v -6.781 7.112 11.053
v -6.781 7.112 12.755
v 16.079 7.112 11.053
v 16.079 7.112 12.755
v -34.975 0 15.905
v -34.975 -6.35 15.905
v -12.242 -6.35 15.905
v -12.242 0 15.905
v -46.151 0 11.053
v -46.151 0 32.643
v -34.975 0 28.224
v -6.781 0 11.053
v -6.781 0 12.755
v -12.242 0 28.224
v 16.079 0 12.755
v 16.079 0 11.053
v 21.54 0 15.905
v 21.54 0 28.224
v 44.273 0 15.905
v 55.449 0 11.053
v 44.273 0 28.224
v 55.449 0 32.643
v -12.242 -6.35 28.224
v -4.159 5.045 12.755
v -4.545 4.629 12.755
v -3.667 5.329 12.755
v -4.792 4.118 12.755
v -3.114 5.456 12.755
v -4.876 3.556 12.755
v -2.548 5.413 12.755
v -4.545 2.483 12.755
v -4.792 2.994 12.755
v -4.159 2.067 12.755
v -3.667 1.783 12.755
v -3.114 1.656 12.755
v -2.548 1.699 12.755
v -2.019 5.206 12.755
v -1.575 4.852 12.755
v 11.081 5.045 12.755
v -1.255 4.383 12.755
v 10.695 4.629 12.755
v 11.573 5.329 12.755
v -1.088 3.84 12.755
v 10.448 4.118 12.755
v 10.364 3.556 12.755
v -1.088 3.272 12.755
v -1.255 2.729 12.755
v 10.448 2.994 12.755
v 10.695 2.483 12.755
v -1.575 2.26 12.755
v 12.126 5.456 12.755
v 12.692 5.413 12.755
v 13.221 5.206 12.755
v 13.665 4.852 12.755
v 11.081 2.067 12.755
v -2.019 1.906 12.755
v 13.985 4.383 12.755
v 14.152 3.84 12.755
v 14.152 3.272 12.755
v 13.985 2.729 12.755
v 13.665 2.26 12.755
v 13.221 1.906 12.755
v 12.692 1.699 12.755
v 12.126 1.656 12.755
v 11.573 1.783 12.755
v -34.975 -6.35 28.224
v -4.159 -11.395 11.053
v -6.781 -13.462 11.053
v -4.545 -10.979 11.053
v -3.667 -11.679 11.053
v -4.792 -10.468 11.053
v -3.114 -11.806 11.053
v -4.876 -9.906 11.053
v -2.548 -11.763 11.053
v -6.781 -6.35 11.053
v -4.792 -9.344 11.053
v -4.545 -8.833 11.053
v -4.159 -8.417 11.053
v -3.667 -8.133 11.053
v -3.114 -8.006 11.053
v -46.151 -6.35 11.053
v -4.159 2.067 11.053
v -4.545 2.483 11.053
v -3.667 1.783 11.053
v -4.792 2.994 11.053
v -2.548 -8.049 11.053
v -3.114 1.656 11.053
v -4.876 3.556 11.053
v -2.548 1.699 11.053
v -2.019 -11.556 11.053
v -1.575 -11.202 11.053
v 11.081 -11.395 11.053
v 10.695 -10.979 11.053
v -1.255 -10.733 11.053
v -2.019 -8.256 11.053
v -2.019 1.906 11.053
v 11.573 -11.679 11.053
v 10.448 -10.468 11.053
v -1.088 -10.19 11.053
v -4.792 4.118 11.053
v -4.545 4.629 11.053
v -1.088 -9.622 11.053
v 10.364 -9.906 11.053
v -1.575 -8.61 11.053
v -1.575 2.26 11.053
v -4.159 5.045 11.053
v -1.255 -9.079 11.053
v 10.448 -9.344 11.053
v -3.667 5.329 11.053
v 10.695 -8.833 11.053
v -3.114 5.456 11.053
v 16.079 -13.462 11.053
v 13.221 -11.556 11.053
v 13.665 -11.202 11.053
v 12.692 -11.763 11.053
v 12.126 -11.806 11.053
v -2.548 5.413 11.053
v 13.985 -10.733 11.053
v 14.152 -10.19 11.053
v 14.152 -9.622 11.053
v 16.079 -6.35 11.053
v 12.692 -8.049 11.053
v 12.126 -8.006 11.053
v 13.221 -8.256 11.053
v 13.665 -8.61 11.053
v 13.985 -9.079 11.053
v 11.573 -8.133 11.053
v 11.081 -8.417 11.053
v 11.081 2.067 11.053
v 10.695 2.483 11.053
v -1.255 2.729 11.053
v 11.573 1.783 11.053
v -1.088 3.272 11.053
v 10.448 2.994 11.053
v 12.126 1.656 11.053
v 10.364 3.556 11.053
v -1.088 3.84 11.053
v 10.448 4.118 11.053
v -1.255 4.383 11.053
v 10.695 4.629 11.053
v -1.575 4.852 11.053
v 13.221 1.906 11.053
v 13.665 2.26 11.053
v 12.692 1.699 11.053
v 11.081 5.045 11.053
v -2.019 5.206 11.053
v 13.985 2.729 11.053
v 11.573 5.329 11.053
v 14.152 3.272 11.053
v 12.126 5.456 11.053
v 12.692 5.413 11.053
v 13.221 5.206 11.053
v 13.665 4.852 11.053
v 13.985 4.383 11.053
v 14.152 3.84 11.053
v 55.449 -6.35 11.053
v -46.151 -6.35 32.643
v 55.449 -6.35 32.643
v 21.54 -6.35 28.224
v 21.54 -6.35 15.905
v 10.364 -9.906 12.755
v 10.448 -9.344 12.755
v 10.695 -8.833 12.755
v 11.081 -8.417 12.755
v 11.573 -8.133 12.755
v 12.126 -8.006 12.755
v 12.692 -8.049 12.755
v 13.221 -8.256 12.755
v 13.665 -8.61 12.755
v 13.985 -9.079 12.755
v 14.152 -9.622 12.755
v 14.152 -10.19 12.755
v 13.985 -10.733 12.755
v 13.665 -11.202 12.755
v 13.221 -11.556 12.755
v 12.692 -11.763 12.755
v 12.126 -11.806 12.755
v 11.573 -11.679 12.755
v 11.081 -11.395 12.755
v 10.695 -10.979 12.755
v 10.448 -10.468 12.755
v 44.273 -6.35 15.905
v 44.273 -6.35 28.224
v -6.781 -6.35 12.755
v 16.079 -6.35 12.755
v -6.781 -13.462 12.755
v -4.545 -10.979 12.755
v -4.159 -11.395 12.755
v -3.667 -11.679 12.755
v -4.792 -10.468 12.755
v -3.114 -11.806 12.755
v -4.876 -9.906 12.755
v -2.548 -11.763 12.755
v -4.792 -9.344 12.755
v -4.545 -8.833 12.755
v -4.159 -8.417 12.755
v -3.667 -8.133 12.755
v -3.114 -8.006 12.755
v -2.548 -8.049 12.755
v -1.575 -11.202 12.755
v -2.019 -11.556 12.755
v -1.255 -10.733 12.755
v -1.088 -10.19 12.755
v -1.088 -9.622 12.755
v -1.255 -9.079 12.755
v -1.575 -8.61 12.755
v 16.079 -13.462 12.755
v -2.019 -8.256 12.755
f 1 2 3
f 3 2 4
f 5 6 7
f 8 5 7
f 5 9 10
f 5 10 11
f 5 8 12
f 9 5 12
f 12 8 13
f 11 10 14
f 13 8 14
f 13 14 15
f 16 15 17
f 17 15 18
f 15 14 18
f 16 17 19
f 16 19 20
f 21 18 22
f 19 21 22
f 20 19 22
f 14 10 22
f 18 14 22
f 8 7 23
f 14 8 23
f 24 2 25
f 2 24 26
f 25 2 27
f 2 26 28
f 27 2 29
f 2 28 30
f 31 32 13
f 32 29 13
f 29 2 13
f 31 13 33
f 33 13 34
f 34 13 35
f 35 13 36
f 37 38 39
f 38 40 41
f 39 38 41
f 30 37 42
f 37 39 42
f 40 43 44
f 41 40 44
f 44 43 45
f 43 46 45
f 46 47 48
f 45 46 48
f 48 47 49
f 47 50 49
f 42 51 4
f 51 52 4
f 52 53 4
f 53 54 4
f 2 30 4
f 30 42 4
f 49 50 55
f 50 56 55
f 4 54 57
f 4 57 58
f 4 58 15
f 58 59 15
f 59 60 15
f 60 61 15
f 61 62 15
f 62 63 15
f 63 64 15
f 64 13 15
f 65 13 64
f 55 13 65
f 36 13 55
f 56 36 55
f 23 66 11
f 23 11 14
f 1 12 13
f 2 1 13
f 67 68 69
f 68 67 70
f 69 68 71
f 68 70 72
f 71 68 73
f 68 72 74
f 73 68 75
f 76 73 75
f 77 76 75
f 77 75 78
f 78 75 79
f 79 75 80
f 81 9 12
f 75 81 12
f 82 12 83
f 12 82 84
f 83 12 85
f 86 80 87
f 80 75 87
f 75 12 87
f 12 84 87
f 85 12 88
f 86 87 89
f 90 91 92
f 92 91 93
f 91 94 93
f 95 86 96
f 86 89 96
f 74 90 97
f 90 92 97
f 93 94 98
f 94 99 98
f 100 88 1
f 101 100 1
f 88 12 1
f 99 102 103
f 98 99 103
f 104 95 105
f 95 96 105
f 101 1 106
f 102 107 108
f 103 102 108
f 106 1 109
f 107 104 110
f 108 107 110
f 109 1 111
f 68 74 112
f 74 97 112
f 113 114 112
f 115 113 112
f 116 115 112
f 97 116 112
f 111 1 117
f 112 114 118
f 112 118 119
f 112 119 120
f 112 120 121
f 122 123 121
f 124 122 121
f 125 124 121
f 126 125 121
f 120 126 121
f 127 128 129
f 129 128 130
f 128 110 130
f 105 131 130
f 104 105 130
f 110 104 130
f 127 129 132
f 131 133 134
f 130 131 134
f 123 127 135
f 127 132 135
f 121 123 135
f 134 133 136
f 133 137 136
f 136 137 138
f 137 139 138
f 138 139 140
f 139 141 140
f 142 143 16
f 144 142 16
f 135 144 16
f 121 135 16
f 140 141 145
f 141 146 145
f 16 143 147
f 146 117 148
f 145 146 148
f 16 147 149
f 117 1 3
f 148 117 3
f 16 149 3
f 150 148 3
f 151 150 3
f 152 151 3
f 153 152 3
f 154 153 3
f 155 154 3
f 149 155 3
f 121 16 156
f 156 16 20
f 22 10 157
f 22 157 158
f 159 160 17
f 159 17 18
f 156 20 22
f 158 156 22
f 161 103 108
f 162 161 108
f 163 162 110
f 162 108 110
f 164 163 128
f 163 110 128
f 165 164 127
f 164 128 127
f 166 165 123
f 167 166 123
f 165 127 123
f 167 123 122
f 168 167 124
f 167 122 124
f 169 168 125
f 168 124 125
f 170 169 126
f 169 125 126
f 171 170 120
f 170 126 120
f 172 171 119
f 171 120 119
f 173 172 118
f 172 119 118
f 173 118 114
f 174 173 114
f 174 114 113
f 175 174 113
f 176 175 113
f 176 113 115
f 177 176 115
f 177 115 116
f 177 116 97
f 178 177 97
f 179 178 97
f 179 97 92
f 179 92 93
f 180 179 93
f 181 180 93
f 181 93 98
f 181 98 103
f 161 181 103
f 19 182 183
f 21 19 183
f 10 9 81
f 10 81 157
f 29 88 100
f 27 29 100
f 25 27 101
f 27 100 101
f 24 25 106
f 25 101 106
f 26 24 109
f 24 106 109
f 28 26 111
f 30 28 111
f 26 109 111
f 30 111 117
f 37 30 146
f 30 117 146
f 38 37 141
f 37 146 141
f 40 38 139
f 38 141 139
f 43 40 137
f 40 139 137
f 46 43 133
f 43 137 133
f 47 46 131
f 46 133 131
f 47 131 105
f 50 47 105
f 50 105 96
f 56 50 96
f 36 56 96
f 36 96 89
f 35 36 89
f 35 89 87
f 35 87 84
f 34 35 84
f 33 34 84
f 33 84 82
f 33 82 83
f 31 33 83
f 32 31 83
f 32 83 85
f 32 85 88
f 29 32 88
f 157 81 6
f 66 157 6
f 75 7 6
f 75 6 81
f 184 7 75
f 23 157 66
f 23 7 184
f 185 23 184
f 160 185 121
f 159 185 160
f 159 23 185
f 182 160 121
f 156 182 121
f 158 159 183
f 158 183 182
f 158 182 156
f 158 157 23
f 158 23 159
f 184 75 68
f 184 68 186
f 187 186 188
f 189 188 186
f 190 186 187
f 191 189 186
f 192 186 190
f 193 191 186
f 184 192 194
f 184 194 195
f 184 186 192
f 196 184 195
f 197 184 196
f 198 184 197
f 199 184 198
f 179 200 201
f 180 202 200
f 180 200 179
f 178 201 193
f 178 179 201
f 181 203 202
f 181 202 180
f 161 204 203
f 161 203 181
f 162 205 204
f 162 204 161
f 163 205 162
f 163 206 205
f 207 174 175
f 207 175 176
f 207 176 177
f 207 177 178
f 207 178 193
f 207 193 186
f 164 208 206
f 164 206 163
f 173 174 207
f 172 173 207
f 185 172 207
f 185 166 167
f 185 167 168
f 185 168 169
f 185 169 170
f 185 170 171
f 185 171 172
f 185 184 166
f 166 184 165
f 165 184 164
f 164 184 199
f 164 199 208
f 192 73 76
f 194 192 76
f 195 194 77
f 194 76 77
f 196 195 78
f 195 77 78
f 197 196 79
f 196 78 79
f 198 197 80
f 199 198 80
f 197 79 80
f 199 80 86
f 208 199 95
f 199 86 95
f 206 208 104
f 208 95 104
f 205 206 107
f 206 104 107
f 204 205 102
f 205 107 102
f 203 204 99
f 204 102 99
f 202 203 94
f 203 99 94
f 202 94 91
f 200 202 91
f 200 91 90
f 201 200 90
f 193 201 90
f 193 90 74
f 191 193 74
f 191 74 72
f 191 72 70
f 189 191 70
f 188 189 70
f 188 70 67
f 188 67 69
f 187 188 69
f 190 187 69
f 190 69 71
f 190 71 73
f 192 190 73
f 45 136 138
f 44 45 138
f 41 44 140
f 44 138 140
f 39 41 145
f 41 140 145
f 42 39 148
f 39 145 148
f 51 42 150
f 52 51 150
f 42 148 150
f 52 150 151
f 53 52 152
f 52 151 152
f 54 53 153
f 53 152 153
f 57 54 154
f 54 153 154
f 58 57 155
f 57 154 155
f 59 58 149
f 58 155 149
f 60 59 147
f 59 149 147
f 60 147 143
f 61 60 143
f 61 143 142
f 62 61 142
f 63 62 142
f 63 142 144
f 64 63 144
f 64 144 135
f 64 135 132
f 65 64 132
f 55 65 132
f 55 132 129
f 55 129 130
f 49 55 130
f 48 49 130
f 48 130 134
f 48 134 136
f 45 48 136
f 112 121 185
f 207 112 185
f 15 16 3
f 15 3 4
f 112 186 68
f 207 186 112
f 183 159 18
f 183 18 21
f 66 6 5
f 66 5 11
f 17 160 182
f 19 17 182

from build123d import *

# Parameters (mm, degrees)
F0_W     = 101.6
F0_H     = 21.59
F1_DEPTH = 6.35
F2_W     = 22.733
F2_H     = 12.319
F3_DEPTH = 25.4
F4_W     = 22.86
F4_H     = 1.7018
F5_DEPTH = 7.112
F6_W     = 22.86
F6_H     = 1.7018
F7_DEPTH = 7.112
F9_D     = 3.81


with BuildPart() as f1:
    # F0 (on Front) → F1 (new body)
    with BuildSketch(Plane.XZ):
        with Locations((4.648548, 21.848283)):
            Rectangle(F0_W, F0_H)
    extrude(amount=F1_DEPTH)

    # F2 (on face) → F3 (cut)
    with BuildSketch(Plane.XZ.offset(6.35)):
        with Locations((-23.608952, 22.064183)):
            Rectangle(F2_W, F2_H)
        with Locations((32.906048, 22.064183)):
            Rectangle(F2_W, F2_H)
    extrude(amount=-F3_DEPTH, mode=Mode.SUBTRACT)

    # F4 (on face) → F5 (join)
    with BuildSketch(Plane.XZ.offset(6.35)):
        with Locations((4.648548, 11.904183)):
            Rectangle(F4_W, F4_H)
    extrude(amount=F5_DEPTH)

    # F6 (on Front) → F7 (join)
    with BuildSketch(Plane.XZ):
        with Locations((4.648548, 11.904183)):
            Rectangle(F6_W, F6_H)
    extrude(amount=-F7_DEPTH)

    # F9 (through all)
    with Locations(Plane.XY.offset(12.755083)):
        with Locations((-2.971452, 3.556), (12.268548, 3.556), (12.268548, -9.906), (-2.971452, -9.906)):
            Hole(F9_D / 2)


solid = f1.part
